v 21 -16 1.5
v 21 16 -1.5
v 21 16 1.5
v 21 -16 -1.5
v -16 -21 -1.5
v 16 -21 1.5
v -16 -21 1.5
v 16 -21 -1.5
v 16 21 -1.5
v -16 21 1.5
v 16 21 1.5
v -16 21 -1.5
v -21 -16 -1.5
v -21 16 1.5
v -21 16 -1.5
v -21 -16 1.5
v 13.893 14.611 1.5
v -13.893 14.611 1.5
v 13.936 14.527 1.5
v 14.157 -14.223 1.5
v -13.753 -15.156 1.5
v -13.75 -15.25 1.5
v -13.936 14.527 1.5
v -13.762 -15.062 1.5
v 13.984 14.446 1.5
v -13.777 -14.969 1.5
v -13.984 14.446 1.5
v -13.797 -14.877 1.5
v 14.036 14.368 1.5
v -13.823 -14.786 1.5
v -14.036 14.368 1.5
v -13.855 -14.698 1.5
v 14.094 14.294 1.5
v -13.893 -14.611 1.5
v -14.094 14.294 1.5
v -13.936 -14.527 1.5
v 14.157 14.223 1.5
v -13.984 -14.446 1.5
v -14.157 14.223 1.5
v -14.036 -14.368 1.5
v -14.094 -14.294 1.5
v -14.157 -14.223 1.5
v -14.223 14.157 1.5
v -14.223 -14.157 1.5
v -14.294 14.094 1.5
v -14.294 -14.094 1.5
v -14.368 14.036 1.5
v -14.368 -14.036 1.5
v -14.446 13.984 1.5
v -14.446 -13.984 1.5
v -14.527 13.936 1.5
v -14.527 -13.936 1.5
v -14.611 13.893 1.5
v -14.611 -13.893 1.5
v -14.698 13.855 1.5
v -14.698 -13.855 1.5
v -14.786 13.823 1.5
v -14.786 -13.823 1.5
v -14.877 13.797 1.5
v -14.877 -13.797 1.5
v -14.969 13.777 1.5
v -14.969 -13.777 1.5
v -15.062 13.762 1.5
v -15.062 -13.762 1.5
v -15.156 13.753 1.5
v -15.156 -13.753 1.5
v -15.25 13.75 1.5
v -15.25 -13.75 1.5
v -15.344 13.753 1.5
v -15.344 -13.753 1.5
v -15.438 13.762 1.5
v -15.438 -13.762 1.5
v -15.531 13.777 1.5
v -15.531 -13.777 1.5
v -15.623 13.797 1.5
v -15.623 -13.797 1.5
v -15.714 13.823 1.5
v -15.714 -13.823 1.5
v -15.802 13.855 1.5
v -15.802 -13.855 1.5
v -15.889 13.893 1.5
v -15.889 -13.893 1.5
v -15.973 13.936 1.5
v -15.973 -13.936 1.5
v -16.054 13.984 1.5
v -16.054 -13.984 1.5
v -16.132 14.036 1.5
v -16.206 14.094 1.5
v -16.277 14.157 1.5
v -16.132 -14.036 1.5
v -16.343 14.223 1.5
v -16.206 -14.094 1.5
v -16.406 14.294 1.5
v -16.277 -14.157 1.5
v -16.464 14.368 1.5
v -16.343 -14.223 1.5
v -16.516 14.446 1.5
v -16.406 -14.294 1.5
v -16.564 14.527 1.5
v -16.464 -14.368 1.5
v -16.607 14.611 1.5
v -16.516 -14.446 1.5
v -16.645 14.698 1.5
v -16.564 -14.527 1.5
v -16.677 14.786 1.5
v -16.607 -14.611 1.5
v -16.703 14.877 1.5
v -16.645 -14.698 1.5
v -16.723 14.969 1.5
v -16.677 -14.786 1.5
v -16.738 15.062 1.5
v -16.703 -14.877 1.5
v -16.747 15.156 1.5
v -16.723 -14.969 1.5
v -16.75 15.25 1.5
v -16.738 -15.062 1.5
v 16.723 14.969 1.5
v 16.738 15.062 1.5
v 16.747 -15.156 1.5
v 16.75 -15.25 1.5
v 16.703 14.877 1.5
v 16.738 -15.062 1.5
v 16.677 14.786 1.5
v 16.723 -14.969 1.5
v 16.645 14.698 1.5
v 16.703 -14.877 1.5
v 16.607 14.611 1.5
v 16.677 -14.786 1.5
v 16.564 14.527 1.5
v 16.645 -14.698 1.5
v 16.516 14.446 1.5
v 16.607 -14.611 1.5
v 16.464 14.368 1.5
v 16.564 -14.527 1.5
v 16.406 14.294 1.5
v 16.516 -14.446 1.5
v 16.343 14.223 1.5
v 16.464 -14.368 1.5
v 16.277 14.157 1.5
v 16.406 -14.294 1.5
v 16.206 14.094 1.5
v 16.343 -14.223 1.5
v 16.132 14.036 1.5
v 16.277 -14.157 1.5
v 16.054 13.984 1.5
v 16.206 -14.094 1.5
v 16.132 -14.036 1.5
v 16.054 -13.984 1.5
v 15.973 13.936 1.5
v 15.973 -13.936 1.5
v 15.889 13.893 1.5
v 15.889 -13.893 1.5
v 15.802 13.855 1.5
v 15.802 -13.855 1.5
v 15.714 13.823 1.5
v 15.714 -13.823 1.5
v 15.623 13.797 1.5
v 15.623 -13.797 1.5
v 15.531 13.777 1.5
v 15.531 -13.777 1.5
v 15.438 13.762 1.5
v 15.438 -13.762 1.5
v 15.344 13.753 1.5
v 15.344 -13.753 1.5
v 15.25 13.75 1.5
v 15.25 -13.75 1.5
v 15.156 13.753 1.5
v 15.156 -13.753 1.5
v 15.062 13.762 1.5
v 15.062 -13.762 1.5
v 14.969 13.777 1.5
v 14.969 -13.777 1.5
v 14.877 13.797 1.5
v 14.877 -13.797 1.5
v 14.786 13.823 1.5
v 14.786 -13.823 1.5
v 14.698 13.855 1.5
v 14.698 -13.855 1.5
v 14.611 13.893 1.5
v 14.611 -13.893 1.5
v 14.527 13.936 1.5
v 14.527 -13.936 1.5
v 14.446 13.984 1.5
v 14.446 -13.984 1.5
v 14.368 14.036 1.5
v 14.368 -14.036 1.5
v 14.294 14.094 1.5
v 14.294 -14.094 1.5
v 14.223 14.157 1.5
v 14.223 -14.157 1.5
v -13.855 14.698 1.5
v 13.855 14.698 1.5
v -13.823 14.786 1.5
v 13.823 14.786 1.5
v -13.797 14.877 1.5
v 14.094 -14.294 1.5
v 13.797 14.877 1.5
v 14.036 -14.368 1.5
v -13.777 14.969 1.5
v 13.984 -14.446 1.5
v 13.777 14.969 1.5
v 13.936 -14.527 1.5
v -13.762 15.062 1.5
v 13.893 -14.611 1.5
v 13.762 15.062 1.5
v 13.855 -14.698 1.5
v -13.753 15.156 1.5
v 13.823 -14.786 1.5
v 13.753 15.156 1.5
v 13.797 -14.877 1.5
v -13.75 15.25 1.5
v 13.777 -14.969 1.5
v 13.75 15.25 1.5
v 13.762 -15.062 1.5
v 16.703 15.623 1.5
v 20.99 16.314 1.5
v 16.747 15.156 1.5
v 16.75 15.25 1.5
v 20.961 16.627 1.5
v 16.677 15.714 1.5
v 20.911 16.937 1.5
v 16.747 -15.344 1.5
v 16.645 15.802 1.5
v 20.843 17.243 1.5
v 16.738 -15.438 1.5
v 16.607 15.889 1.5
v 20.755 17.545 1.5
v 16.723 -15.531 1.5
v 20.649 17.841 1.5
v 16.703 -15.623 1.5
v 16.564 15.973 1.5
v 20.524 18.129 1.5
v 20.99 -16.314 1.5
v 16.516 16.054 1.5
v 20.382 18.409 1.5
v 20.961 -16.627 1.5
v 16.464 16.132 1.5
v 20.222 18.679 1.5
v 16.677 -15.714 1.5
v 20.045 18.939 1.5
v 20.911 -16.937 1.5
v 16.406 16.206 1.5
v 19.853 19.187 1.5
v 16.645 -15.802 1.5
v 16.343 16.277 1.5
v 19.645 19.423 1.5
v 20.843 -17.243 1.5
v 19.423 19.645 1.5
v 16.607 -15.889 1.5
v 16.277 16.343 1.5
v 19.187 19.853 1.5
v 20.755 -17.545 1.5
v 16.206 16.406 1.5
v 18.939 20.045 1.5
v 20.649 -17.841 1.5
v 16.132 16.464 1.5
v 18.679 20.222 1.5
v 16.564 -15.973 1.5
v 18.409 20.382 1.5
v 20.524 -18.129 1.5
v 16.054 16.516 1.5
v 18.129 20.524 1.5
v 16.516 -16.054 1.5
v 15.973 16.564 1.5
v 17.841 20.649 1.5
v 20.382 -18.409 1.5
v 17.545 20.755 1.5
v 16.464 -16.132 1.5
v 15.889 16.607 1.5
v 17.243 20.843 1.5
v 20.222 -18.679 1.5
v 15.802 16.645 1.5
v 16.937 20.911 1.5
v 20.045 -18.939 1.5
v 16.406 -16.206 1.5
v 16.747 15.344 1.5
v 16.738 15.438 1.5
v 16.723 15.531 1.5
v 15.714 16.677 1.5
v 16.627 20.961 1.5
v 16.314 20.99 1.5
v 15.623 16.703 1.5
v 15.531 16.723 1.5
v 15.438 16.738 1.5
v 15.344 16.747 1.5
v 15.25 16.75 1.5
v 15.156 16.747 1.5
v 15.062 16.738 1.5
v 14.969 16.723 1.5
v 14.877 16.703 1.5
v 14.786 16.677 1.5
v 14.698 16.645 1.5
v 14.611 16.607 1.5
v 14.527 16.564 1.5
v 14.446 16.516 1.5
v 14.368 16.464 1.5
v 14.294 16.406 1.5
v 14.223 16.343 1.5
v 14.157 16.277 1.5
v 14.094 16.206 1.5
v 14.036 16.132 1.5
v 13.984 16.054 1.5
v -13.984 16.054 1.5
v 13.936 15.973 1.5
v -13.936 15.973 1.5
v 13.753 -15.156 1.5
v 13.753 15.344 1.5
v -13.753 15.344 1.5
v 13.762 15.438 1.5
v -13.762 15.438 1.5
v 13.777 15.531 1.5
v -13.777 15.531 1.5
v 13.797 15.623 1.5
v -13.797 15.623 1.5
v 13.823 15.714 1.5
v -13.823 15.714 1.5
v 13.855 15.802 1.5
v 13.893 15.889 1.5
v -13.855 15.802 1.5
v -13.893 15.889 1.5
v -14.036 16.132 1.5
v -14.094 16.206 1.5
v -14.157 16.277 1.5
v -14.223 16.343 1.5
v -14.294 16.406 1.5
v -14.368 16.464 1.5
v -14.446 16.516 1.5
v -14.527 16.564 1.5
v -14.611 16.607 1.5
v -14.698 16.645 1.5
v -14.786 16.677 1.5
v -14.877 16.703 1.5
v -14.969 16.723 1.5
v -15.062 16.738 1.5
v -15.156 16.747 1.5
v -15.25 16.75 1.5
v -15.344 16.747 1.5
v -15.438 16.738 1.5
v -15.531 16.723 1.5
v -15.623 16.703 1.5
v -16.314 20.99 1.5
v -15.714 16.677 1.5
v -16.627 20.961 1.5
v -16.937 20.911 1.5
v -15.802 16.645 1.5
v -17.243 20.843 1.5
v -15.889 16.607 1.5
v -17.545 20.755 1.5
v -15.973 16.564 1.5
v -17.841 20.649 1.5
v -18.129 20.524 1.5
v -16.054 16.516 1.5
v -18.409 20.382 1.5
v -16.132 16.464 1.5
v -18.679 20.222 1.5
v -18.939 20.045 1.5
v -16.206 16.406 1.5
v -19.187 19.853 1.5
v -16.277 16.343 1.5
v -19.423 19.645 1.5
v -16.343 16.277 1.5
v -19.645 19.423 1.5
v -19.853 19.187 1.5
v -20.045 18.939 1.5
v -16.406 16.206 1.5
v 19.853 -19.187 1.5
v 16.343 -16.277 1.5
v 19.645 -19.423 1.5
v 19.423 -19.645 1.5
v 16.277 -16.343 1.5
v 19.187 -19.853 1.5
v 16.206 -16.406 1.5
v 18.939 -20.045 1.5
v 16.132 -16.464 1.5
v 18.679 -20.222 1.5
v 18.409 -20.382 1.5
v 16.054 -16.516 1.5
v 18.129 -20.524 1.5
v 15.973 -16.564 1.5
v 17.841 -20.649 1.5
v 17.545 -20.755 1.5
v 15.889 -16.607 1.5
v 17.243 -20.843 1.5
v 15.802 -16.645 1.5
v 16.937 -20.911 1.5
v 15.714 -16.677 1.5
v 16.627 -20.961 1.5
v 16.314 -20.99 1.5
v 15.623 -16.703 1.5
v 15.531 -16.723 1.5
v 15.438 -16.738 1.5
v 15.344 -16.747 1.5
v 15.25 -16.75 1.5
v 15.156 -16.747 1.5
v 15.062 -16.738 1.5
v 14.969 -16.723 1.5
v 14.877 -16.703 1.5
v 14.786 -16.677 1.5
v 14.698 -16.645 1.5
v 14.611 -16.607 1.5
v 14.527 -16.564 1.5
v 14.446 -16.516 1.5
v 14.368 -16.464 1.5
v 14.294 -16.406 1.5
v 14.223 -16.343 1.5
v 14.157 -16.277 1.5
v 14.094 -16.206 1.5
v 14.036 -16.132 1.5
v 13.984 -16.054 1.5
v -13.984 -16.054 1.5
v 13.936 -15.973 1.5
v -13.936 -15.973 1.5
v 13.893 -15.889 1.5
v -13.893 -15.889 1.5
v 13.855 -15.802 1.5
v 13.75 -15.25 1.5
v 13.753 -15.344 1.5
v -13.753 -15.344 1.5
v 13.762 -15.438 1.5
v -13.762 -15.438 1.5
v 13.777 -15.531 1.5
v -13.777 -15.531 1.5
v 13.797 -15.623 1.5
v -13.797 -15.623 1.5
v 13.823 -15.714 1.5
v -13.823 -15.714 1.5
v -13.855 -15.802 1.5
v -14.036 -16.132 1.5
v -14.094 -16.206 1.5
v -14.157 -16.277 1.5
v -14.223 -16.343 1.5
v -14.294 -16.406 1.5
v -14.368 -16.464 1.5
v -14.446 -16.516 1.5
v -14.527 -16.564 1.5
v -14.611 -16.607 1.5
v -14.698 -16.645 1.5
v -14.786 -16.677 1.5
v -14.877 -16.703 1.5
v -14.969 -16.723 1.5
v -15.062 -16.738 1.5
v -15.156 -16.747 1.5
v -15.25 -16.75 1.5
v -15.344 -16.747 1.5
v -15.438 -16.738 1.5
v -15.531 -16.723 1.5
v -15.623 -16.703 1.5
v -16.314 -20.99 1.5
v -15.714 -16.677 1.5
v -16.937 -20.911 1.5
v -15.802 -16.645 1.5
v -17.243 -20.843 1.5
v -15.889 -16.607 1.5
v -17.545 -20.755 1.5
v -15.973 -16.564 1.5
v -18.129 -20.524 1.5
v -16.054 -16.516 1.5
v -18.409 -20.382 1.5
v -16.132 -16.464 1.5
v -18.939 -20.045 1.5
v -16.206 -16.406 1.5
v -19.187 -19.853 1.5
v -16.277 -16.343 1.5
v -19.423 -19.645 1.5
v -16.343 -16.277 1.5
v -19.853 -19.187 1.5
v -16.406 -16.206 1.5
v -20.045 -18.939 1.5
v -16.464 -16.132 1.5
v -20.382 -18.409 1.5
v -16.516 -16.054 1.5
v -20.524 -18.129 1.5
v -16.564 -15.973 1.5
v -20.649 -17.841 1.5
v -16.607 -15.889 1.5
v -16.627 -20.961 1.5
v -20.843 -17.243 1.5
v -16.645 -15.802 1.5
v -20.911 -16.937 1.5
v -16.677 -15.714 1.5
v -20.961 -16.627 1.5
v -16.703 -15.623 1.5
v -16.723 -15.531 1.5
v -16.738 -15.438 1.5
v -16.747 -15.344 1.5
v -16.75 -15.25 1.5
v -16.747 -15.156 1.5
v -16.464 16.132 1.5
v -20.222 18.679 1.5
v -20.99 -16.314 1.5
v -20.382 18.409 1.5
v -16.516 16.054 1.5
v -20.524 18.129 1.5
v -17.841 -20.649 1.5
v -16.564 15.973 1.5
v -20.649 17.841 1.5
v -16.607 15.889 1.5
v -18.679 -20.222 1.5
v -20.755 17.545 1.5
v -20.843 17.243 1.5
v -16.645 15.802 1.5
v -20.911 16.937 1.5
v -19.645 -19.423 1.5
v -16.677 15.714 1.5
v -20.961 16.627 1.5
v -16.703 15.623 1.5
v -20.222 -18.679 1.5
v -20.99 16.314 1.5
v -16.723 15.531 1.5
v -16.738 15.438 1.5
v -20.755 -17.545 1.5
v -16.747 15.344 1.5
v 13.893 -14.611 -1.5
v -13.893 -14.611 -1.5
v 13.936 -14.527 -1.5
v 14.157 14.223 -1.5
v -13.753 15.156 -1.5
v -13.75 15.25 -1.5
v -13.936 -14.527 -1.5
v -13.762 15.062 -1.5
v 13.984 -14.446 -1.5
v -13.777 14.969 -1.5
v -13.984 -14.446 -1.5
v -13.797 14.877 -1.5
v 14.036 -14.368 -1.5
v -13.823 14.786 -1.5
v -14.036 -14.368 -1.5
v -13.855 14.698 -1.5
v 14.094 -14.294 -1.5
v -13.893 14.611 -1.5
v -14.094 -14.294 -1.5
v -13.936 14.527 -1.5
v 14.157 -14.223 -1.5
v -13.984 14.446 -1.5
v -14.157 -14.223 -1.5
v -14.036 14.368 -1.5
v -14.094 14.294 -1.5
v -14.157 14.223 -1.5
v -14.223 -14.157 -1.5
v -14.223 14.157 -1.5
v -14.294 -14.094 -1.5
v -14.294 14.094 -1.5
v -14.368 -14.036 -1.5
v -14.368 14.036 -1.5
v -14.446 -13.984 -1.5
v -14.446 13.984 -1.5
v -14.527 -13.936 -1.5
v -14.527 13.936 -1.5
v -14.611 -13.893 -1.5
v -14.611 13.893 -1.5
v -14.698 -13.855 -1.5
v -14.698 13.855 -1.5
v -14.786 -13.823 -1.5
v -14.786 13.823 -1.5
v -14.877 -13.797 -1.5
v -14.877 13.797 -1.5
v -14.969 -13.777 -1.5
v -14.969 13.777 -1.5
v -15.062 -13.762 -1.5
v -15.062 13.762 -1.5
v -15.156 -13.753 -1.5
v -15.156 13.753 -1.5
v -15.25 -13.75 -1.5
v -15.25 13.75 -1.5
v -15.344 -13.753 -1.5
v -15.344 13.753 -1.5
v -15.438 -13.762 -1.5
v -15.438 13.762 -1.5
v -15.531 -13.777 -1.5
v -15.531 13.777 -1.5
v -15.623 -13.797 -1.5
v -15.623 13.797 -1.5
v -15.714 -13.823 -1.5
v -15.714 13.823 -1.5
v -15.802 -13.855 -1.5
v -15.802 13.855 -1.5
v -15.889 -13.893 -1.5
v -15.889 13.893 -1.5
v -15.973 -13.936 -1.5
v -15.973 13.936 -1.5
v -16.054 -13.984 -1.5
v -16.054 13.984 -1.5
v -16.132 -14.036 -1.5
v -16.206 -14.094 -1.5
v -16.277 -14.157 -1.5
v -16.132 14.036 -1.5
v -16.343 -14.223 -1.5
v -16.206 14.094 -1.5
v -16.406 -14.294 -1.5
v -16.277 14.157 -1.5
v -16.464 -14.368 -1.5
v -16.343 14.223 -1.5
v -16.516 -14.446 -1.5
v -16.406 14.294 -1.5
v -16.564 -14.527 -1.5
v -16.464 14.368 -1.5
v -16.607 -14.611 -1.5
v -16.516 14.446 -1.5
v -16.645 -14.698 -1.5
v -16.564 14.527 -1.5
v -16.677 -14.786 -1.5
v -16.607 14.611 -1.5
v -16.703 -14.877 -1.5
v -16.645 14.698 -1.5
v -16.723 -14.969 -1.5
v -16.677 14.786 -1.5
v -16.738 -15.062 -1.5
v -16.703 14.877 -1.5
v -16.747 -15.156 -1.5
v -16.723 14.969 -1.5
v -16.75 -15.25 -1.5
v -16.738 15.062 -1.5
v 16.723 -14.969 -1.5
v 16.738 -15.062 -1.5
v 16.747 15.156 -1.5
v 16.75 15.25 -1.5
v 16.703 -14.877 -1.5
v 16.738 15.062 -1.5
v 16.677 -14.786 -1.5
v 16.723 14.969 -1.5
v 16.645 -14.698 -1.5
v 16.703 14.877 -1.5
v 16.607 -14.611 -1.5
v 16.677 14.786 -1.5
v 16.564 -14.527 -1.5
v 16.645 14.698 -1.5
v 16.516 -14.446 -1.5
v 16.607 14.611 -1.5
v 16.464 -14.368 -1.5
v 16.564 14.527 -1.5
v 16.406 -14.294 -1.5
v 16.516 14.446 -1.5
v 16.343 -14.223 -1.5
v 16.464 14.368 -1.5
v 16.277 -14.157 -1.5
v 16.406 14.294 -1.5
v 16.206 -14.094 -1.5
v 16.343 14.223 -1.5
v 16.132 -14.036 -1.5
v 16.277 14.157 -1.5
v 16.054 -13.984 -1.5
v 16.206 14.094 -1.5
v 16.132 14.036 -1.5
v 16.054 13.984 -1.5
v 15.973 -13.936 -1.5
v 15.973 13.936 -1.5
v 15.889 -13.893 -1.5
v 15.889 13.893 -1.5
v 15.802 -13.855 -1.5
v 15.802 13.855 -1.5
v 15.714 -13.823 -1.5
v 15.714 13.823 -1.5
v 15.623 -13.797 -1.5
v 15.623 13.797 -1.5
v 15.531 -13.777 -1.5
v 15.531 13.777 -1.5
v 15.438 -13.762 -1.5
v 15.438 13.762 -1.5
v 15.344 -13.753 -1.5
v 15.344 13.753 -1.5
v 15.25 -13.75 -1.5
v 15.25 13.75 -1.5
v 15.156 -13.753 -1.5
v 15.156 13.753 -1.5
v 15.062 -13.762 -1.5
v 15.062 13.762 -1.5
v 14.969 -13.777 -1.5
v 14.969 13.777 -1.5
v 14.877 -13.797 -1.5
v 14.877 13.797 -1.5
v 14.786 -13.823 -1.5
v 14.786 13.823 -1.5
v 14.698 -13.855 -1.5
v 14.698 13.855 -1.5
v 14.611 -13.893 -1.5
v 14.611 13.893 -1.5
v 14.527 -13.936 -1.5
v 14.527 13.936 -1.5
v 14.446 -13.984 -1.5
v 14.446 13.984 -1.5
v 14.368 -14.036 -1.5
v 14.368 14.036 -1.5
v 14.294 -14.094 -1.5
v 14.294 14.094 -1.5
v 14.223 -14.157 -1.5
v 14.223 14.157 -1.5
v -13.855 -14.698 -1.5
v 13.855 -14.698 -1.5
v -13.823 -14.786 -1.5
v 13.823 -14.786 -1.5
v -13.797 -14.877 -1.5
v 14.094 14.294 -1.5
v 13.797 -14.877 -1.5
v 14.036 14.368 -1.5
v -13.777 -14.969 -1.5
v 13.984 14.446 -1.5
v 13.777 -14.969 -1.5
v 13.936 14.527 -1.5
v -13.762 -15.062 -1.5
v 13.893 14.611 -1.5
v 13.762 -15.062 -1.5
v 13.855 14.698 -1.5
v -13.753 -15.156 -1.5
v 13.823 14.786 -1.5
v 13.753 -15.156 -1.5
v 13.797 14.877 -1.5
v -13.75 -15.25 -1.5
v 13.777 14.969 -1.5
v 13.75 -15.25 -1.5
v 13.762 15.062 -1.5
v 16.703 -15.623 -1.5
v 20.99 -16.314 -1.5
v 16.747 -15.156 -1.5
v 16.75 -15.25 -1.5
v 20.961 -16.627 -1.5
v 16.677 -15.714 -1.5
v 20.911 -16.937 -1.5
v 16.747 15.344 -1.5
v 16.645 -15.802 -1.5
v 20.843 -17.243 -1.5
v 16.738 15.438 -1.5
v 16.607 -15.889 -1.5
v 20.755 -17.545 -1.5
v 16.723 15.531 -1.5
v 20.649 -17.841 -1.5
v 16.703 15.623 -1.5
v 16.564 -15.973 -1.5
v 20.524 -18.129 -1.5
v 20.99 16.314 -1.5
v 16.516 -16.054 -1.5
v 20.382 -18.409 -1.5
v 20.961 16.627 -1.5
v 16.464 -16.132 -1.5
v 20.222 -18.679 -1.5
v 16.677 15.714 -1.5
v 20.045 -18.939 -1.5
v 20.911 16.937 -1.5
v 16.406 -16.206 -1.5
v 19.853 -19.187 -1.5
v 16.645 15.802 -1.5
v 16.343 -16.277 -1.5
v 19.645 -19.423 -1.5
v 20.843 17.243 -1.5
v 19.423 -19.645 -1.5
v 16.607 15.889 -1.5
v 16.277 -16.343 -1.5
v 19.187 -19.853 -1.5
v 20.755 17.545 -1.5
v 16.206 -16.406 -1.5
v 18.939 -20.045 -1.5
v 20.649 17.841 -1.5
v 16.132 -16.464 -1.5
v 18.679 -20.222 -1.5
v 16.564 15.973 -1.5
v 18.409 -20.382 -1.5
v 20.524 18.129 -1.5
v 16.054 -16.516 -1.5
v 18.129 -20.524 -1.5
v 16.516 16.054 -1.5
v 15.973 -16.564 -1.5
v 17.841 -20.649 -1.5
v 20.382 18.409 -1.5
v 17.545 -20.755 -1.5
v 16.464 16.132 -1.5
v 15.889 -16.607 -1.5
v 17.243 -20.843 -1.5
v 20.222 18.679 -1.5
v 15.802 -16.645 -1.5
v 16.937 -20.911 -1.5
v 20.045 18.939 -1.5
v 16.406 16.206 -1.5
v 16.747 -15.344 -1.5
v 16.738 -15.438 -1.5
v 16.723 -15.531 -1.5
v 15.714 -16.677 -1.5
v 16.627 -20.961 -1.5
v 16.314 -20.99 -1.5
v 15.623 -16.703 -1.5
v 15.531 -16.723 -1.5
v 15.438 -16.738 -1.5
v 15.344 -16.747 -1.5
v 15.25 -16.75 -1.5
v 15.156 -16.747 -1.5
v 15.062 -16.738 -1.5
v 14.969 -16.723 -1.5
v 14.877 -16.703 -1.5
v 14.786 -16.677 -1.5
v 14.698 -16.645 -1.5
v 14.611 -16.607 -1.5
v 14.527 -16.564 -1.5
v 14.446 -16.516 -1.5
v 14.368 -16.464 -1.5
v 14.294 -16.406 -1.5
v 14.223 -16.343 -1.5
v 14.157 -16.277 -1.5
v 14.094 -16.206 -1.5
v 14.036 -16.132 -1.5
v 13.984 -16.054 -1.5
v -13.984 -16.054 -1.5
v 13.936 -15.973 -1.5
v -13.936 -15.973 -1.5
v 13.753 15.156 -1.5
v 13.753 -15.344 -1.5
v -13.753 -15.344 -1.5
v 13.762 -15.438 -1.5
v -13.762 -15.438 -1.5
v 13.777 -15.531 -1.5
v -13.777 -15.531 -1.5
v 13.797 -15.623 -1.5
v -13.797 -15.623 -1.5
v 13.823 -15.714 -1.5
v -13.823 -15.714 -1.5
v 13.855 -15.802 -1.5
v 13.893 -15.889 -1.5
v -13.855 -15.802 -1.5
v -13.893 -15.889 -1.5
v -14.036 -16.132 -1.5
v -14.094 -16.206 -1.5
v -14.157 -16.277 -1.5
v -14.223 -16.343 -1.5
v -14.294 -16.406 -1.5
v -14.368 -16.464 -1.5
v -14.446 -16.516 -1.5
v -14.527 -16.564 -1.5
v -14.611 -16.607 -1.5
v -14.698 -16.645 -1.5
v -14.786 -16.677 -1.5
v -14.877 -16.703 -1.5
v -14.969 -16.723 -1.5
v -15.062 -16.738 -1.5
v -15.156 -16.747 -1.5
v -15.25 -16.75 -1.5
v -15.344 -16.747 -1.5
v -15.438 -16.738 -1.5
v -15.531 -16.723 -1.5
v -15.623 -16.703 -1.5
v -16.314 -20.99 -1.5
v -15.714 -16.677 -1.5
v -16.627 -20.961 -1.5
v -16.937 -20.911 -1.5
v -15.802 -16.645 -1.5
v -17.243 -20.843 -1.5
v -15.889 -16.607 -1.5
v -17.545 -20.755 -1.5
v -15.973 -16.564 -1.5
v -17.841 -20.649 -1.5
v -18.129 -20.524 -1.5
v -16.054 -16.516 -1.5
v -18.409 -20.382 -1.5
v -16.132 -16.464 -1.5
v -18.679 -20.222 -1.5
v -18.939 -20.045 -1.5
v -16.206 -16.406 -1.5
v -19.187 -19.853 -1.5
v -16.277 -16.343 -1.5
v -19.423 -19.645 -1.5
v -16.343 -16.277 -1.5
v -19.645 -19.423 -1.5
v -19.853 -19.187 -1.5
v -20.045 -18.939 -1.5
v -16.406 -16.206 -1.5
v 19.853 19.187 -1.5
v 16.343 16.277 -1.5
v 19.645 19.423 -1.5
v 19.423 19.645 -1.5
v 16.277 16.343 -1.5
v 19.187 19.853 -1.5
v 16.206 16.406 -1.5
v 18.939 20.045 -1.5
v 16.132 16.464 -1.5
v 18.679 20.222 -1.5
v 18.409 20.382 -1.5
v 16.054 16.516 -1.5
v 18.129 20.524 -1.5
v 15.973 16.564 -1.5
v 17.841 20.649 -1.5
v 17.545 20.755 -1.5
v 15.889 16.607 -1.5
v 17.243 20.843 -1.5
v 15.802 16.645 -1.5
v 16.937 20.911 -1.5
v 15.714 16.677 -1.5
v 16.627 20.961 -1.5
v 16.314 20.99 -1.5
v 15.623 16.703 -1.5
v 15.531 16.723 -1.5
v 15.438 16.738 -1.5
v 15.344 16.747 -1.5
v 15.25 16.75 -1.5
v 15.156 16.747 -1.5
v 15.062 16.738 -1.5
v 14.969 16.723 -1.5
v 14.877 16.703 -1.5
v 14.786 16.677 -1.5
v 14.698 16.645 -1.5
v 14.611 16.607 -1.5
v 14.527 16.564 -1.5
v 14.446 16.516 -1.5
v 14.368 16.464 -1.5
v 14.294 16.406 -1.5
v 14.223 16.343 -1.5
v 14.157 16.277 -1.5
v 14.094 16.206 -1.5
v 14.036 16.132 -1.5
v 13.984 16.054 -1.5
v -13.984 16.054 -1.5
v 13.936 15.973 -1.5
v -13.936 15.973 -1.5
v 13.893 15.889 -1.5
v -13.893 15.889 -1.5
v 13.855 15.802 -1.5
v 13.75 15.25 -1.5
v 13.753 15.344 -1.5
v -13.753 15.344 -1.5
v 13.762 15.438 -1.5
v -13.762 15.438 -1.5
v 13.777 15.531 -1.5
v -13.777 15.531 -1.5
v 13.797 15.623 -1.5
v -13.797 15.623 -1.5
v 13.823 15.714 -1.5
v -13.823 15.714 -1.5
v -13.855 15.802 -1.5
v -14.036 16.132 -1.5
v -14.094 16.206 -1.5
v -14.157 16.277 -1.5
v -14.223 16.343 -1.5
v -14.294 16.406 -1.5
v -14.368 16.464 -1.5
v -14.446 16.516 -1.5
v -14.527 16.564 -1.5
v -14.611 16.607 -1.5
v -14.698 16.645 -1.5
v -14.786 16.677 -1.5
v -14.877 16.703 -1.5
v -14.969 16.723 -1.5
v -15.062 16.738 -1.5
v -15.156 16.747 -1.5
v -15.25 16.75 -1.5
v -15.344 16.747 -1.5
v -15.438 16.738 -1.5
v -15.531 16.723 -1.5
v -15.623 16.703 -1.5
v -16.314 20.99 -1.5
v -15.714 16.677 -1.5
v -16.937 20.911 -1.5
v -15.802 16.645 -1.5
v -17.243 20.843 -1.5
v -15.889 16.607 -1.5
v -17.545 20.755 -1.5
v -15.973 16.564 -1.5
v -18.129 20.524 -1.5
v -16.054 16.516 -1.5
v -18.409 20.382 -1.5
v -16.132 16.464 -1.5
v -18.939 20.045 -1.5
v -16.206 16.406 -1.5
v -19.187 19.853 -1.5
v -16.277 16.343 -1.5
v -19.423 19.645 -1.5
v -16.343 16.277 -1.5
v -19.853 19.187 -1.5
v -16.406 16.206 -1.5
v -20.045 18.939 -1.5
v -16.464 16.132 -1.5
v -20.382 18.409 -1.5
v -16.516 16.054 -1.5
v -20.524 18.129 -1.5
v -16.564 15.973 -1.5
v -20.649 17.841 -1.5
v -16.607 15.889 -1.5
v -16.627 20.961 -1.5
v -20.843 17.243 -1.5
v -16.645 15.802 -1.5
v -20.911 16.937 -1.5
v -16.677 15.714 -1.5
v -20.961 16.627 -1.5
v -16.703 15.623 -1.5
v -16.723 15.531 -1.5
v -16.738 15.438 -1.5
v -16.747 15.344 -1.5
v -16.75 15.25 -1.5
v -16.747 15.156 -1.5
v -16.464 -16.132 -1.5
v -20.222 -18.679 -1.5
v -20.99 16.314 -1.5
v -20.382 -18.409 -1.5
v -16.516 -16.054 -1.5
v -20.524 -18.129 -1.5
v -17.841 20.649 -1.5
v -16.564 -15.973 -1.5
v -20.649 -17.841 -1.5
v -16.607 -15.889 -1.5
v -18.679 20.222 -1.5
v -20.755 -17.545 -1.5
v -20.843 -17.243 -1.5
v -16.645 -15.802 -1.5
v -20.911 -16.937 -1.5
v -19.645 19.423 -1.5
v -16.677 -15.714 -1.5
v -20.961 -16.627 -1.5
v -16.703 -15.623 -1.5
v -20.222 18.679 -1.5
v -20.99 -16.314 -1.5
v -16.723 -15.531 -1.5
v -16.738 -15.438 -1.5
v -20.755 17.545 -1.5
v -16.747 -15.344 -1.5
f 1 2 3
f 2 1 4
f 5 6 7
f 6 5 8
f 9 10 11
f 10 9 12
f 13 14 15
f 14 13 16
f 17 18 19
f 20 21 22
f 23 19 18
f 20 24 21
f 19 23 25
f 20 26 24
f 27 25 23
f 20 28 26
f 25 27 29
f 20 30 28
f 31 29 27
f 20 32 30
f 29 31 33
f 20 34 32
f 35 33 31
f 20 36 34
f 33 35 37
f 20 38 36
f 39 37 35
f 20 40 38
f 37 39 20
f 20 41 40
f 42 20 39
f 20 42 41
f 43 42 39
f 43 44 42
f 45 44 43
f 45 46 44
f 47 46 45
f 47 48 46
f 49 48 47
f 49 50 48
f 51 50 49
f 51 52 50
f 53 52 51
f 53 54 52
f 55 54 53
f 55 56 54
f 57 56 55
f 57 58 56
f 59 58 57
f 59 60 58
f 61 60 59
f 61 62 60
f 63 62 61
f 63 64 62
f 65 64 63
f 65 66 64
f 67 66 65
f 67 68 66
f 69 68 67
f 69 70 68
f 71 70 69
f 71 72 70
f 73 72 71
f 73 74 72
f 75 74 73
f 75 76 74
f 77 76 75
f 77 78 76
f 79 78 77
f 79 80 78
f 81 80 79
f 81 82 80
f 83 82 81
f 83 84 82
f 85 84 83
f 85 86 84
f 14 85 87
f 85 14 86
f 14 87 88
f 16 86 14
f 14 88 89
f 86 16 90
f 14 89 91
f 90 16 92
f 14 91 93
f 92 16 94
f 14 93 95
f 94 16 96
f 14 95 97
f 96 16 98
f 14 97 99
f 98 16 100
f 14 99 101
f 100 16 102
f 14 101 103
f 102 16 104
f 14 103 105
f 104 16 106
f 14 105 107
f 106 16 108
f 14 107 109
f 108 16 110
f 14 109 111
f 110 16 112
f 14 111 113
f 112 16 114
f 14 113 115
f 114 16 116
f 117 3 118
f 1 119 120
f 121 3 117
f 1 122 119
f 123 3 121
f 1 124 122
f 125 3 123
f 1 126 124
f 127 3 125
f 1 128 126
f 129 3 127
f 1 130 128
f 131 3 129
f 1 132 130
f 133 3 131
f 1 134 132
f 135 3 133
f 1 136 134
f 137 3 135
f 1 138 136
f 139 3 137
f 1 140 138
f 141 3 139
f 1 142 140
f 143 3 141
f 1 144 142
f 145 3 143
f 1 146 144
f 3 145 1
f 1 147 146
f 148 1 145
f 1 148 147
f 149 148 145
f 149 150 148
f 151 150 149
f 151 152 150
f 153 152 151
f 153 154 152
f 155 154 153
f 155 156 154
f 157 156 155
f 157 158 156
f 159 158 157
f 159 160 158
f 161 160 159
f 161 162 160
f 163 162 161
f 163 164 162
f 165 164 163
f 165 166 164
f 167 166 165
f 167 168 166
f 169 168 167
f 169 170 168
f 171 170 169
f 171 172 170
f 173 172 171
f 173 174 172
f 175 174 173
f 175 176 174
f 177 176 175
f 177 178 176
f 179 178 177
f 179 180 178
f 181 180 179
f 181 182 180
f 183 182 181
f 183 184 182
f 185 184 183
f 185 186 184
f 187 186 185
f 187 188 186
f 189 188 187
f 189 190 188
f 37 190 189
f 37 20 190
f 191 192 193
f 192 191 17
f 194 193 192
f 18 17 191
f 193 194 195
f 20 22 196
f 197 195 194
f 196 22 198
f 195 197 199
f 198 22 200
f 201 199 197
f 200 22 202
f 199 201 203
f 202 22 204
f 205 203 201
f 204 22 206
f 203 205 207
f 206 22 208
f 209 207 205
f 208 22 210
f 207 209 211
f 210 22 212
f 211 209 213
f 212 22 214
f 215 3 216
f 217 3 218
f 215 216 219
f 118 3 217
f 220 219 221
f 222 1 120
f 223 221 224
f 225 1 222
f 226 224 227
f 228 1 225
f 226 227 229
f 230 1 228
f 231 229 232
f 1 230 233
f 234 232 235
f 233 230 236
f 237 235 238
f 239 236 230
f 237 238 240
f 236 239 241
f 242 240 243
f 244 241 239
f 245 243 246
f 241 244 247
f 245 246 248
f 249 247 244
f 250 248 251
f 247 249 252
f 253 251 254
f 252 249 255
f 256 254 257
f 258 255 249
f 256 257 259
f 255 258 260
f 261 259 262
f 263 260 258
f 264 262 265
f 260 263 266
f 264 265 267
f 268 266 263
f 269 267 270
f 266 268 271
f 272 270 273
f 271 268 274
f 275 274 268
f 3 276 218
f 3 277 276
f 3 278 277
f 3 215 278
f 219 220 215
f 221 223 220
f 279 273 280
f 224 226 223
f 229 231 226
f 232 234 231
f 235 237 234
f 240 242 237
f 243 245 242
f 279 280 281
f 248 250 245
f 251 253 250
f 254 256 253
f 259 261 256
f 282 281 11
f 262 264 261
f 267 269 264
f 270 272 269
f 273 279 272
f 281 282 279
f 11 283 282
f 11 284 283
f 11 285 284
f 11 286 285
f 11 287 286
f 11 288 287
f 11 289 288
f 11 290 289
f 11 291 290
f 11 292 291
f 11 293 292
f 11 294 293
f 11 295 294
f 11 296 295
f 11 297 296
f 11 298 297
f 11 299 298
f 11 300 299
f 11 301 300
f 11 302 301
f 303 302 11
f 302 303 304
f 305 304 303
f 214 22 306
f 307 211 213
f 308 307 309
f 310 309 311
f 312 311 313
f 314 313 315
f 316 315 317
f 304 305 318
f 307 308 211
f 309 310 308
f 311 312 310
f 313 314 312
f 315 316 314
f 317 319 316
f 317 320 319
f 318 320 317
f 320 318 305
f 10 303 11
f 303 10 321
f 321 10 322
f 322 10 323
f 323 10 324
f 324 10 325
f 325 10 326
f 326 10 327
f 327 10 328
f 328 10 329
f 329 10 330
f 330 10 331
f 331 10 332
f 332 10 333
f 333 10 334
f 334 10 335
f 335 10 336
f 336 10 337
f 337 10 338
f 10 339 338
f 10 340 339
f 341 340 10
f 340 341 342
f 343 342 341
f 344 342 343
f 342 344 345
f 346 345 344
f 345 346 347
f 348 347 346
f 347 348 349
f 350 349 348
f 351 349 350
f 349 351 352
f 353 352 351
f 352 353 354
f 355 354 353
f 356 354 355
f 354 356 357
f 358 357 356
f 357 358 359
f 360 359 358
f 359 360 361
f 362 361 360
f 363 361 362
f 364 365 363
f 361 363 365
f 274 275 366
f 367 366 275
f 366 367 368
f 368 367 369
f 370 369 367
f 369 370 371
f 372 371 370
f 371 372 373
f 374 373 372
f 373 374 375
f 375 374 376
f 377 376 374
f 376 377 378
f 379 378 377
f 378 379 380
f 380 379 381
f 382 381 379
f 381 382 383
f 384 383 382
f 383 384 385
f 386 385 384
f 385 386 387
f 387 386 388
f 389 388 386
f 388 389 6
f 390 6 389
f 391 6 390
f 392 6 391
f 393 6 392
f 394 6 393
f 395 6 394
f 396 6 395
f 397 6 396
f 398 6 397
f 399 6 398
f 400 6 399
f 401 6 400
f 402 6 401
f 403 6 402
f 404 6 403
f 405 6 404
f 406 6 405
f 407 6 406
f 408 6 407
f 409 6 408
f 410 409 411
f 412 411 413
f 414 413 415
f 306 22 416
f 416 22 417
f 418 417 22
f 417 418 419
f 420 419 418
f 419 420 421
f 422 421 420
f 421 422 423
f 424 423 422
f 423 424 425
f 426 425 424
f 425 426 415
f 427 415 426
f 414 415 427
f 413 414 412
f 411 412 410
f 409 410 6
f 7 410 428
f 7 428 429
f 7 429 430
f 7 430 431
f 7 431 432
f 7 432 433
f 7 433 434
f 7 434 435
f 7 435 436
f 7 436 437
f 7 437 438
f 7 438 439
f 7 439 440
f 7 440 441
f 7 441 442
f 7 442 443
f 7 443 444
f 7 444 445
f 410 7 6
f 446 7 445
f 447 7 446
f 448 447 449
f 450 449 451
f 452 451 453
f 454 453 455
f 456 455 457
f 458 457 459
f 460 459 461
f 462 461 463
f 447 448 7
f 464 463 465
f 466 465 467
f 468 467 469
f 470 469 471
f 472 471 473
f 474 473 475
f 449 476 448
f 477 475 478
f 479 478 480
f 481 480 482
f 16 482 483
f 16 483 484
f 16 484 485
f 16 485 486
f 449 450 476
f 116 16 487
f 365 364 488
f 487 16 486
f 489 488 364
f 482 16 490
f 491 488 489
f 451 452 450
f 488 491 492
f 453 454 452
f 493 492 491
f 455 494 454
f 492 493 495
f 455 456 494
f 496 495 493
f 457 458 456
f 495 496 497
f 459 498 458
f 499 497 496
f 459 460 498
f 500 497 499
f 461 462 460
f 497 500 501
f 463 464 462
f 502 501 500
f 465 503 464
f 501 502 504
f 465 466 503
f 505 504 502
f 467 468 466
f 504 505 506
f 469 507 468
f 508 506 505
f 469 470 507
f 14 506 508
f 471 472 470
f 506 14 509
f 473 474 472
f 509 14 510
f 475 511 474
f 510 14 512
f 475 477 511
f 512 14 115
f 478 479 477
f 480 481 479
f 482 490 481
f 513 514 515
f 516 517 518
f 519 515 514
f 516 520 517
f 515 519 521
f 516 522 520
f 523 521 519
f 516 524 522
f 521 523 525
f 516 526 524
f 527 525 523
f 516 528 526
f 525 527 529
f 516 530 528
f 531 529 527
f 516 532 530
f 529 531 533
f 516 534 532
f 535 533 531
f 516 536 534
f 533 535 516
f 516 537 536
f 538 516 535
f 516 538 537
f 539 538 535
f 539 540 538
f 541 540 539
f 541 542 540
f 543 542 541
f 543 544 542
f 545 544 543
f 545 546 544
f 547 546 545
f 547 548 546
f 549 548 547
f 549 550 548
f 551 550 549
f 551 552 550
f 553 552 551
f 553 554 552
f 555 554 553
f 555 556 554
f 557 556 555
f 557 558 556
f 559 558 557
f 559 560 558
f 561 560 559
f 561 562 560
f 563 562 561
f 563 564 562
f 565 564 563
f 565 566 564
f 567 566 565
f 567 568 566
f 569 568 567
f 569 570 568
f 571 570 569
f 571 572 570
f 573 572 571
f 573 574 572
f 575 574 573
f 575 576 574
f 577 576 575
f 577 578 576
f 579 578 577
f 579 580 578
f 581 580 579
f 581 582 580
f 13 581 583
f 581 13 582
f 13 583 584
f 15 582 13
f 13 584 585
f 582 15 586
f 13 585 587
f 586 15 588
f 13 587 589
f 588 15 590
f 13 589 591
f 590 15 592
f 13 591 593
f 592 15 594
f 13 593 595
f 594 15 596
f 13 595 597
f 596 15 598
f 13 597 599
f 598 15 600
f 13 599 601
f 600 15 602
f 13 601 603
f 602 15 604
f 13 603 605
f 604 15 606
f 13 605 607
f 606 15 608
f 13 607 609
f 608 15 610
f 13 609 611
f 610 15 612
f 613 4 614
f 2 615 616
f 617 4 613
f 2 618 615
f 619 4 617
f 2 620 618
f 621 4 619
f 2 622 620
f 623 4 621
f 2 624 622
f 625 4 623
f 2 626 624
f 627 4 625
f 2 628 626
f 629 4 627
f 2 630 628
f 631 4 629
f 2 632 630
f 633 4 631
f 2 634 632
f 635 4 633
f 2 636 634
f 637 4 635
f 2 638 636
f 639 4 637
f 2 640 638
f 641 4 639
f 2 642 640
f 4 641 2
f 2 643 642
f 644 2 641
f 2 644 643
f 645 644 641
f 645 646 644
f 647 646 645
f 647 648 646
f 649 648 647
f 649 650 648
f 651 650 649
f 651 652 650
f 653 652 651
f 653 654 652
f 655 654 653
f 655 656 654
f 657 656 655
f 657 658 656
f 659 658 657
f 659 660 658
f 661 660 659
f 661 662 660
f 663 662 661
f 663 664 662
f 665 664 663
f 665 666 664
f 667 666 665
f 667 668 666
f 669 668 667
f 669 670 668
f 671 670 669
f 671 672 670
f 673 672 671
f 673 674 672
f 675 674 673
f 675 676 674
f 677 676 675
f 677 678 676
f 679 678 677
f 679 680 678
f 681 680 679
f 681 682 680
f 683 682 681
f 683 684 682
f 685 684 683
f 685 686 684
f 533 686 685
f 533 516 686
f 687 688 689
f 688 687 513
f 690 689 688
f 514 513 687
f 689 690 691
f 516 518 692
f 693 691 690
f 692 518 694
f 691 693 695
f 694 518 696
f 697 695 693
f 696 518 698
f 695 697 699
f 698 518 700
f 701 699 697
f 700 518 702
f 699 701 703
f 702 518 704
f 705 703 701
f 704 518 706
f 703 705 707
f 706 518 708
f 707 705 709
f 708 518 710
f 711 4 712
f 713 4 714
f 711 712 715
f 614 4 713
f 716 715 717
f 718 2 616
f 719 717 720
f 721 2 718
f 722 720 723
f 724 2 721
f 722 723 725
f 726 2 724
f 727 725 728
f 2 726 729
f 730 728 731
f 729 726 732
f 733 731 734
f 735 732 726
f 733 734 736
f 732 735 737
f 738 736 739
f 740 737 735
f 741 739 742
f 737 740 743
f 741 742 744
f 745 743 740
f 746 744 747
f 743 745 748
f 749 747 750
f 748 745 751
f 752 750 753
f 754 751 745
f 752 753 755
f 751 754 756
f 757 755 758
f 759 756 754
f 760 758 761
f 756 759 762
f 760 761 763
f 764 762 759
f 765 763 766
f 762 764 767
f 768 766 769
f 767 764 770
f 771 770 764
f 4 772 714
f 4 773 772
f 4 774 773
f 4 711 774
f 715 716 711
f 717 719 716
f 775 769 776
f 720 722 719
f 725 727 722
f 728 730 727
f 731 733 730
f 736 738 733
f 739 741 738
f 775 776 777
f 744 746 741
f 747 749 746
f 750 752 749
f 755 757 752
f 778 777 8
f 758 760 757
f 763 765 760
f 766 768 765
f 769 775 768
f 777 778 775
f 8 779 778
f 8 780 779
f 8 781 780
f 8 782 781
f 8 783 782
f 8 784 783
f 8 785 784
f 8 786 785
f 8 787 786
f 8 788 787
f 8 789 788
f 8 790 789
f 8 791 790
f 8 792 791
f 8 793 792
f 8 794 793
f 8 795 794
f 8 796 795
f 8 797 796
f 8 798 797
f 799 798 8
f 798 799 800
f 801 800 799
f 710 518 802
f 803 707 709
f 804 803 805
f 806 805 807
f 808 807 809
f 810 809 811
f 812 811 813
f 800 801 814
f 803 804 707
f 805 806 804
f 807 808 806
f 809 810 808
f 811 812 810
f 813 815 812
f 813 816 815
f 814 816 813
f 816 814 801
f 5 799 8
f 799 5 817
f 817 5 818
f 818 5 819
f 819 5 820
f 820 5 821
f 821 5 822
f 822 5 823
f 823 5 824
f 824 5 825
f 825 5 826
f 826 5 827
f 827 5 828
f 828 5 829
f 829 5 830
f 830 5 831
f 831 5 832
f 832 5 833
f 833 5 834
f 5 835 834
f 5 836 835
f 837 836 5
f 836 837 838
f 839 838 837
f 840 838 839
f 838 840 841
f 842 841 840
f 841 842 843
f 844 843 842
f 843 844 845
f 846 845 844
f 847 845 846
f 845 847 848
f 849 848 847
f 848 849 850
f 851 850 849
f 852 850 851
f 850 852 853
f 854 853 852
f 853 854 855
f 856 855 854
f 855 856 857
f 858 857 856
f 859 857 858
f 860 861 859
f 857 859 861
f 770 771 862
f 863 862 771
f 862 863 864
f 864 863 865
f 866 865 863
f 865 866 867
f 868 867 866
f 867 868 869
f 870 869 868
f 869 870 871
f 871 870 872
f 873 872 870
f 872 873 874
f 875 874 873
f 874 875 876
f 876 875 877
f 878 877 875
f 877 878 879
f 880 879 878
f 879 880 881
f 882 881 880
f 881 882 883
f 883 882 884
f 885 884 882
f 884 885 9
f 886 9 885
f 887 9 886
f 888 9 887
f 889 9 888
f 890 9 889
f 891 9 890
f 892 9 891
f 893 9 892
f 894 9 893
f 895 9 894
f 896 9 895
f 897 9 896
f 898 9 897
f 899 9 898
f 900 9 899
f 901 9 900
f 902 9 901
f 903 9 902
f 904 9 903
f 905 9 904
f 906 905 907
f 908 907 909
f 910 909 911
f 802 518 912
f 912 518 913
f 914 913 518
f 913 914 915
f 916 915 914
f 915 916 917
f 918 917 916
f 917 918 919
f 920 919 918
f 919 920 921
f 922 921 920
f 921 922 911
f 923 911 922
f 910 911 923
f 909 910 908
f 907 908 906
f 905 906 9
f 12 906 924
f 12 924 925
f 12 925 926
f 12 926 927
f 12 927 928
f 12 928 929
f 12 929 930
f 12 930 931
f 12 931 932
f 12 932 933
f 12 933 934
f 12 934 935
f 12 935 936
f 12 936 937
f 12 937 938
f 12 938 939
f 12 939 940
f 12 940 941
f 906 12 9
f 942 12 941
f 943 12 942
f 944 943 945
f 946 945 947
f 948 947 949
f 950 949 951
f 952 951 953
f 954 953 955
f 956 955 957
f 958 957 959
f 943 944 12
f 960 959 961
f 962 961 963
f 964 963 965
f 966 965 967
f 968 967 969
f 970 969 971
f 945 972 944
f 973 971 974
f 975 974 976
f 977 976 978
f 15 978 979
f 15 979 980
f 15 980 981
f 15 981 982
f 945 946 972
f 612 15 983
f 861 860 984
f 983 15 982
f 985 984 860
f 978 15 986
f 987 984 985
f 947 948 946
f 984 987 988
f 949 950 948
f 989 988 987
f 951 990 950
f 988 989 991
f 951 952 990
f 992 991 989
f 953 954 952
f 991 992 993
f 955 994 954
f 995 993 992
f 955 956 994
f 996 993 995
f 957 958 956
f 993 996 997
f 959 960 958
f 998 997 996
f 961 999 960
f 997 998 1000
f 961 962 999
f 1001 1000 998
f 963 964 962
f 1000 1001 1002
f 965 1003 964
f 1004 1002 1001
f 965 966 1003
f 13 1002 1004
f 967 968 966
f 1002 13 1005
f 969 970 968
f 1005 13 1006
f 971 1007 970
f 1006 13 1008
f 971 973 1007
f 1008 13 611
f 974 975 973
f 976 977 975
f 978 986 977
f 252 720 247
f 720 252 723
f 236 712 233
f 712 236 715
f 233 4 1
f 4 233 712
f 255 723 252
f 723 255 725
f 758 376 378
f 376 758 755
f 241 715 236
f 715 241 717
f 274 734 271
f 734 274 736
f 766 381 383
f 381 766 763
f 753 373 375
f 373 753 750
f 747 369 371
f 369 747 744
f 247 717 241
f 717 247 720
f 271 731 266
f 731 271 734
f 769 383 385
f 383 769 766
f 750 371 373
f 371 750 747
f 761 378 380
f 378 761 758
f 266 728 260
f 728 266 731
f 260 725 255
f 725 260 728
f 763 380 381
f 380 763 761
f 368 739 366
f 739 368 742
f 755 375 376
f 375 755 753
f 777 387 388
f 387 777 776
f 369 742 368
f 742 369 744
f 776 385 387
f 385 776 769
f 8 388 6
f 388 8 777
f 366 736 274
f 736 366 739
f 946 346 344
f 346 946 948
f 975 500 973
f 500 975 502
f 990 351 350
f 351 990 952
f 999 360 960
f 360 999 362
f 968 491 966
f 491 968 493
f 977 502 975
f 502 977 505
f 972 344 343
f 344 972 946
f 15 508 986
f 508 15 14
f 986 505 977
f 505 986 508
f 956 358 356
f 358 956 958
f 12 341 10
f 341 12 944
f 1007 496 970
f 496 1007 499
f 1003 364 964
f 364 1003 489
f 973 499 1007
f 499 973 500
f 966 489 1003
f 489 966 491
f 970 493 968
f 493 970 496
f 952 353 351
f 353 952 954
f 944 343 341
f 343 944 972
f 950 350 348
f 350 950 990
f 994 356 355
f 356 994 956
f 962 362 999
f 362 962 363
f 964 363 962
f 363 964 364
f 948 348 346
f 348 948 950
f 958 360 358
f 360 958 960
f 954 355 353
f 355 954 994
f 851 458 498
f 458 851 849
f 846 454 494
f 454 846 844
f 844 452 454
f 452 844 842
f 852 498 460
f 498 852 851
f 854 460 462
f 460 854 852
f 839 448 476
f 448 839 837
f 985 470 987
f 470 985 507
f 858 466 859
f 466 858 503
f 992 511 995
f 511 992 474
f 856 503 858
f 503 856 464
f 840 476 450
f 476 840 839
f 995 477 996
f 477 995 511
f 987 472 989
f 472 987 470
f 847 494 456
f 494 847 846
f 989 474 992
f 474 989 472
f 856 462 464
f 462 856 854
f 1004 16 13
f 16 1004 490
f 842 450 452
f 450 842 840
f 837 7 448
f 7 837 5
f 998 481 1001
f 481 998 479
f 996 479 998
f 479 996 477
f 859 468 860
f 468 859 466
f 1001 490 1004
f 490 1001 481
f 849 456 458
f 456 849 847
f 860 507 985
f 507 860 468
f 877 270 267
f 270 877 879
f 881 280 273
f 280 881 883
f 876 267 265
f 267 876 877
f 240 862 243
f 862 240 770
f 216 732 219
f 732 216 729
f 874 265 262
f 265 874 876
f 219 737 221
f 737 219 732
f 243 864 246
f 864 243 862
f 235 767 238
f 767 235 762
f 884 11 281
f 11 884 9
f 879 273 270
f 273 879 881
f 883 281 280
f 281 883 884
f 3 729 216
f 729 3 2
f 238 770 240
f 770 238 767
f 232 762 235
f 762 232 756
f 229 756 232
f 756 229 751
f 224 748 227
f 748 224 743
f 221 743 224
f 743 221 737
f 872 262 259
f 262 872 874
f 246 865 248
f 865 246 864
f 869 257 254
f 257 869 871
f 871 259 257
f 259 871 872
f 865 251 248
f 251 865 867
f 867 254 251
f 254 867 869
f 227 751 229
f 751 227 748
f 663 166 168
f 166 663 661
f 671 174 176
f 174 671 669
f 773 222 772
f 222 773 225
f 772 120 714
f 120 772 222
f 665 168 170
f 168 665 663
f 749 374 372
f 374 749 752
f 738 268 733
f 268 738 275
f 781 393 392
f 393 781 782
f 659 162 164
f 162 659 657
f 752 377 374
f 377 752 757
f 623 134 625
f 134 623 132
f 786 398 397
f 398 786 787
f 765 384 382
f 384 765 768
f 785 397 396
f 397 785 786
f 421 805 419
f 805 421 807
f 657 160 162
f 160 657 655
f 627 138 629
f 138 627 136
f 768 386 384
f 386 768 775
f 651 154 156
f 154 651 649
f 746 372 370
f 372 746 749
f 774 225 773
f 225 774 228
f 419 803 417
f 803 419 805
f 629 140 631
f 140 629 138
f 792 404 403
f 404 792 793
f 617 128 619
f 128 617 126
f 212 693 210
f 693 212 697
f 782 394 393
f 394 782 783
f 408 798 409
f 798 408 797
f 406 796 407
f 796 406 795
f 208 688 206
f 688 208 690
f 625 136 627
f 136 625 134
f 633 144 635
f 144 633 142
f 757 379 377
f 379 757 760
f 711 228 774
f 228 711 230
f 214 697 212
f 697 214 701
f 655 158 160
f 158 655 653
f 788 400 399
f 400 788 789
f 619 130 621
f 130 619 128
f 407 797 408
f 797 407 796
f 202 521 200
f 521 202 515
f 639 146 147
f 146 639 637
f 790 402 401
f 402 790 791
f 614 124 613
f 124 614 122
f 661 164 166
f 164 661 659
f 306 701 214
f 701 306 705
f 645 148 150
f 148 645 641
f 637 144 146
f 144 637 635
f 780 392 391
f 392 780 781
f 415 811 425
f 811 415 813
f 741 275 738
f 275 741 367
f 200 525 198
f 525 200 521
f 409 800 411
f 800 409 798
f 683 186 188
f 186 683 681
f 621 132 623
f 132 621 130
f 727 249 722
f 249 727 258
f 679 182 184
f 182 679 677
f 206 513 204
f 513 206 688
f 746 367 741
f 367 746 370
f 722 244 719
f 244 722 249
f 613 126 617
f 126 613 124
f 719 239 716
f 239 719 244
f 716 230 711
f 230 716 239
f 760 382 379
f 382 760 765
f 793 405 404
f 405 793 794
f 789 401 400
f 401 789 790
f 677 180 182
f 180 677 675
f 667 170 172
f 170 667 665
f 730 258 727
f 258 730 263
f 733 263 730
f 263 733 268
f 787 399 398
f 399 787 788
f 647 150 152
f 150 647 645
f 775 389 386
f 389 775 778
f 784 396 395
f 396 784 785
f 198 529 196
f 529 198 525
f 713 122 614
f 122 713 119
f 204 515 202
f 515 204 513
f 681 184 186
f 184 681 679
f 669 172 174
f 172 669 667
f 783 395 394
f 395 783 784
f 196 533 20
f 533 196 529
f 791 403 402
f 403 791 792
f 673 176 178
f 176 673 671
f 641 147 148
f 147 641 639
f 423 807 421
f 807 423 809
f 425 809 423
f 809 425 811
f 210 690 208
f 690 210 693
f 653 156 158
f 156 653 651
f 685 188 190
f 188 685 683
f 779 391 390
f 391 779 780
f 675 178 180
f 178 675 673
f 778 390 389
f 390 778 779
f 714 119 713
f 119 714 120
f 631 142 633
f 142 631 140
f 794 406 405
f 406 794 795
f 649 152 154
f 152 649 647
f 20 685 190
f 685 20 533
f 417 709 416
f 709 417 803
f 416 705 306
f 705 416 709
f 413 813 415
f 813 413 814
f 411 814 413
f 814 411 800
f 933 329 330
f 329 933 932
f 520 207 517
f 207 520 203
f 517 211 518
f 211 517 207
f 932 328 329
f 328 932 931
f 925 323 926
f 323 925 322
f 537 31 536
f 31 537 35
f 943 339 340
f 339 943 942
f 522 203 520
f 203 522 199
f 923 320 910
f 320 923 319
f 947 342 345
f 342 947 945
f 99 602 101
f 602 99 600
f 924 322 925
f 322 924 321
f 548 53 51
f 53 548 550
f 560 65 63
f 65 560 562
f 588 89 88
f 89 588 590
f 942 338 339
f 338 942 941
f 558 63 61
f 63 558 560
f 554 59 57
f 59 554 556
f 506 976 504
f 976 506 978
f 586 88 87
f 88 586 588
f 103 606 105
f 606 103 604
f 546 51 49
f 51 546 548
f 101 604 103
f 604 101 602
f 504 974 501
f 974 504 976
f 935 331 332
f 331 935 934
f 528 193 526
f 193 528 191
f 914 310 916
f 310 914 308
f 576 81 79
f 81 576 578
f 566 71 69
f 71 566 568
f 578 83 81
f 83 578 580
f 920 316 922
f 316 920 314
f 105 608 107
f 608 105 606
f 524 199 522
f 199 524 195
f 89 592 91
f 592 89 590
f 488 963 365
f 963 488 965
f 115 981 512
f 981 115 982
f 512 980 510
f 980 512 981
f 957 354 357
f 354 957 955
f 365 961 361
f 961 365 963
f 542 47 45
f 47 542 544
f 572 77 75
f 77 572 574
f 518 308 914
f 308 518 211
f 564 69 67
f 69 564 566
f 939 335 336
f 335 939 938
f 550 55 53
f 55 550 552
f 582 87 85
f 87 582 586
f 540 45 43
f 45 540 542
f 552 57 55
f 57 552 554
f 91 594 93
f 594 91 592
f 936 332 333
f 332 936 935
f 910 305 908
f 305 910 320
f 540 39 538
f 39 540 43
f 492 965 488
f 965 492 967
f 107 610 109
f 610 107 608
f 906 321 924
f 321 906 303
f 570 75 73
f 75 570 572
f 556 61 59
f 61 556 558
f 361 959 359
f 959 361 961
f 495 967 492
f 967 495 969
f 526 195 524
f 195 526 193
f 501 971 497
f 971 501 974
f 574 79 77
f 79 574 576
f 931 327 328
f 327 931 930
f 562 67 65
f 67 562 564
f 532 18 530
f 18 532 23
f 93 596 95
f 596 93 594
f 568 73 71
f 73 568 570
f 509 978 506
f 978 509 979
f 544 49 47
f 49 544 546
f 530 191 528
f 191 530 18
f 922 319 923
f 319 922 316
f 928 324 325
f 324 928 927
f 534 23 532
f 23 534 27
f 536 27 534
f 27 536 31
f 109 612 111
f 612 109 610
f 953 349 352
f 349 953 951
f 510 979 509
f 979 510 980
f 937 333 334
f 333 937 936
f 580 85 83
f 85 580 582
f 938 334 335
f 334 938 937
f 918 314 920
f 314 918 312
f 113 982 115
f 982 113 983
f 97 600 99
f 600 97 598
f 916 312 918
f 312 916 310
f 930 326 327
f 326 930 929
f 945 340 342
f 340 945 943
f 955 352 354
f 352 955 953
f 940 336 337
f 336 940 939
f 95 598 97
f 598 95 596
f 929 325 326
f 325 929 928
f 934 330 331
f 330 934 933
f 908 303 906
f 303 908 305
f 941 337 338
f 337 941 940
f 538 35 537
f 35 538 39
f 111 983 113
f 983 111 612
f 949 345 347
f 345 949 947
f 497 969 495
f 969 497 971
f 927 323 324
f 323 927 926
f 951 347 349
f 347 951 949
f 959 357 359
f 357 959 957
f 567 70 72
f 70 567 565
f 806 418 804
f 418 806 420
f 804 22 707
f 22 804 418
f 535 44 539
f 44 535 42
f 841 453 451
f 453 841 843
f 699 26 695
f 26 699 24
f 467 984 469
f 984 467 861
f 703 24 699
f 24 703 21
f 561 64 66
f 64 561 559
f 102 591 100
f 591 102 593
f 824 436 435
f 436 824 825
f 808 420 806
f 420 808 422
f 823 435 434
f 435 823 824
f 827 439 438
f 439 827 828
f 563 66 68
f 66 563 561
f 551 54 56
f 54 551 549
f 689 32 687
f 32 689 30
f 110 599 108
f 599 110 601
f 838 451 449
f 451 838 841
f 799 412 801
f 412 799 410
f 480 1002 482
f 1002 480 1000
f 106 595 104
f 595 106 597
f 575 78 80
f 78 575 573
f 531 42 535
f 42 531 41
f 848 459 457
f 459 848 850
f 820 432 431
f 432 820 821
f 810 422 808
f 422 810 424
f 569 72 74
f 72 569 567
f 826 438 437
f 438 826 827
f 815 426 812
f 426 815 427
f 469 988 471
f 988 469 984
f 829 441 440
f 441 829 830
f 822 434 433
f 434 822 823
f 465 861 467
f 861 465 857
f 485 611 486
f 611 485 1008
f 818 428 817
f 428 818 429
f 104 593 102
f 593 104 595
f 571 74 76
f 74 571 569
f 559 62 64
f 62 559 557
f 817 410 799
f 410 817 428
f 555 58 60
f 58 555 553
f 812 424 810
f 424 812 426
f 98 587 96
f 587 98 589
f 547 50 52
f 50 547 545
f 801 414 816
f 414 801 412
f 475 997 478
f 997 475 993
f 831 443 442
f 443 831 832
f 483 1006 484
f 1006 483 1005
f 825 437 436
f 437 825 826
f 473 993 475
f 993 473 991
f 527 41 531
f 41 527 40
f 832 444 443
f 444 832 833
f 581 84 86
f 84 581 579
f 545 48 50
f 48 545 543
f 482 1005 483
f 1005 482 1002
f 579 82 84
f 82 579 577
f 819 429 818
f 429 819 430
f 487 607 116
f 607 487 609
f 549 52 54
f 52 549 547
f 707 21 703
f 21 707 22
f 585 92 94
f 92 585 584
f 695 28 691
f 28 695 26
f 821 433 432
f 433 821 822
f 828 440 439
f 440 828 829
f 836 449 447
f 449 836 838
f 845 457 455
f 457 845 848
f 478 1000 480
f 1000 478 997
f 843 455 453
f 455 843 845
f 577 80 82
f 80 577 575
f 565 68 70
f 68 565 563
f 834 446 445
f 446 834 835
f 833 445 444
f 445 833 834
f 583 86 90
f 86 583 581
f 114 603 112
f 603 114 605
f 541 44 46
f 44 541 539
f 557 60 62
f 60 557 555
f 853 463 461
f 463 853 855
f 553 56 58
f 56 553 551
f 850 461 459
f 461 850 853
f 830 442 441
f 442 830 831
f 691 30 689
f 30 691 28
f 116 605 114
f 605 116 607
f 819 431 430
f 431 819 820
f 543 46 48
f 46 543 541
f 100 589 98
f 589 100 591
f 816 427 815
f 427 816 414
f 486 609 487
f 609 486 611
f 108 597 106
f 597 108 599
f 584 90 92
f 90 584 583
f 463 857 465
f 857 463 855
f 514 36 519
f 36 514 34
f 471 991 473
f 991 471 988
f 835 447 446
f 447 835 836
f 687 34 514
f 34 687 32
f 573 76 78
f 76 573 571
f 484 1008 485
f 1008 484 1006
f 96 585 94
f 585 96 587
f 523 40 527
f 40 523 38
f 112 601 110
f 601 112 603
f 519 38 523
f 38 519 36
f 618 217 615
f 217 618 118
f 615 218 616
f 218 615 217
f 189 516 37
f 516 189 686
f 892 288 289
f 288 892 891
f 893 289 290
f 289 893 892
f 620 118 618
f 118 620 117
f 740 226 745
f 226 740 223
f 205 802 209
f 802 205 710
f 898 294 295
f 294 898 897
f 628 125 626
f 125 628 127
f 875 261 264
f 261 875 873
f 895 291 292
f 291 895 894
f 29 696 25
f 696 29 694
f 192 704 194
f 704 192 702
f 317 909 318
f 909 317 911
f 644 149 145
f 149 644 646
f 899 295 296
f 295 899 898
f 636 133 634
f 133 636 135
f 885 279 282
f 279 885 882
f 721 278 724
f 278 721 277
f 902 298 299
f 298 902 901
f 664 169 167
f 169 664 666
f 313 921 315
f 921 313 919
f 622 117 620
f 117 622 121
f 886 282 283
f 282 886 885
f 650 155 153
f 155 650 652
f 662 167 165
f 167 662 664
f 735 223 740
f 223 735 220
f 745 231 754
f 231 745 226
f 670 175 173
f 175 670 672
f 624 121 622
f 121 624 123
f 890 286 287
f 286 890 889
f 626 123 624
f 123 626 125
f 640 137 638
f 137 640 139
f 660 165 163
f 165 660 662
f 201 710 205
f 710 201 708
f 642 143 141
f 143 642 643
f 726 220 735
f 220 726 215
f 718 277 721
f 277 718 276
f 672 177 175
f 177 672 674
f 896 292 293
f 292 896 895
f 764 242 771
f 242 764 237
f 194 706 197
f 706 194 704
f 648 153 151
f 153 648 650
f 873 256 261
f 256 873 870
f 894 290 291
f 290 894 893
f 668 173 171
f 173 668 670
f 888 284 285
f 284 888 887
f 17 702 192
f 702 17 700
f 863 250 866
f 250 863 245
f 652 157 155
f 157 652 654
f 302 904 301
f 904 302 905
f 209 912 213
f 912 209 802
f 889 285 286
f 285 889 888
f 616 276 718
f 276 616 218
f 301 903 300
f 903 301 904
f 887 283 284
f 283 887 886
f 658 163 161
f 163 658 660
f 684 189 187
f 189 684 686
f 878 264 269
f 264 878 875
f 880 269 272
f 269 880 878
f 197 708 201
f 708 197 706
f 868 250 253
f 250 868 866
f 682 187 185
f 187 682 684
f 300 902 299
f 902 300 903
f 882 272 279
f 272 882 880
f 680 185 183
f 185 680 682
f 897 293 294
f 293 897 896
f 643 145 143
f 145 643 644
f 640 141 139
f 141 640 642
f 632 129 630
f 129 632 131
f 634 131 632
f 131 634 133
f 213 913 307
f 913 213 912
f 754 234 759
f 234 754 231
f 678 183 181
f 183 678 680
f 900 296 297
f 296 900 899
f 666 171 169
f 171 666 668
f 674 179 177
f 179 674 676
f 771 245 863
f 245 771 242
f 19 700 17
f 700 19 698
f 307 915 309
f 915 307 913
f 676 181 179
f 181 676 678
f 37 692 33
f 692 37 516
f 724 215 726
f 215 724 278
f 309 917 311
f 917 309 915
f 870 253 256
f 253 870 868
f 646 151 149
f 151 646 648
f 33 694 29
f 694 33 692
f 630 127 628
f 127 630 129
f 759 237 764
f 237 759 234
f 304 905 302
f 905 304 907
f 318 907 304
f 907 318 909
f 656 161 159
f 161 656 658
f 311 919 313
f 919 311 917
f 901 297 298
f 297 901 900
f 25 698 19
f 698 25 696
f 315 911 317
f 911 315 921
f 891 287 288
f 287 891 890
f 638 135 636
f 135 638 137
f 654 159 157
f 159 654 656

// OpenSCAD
module stepper_holes(depth){
    temp = [1,-1,-1,1];
    for(i=[0:3])
        let(r = 30.5/2, dx = temp[i]*r, dz = temp[(i*2)%4]*r, x=0,y=0,z=0)
            translate([x+dx,y,z+dz])rotate([90,0,0])cylinder(h=depth,r=1.5,$fn=100,center=true);
    
}
module round_cube(size_x, size_y, size_z, r){
    temp = [1,-1,-1, 1];
    difference(){
        cube([size_x, size_y, size_z], center=true);
        for(i=[0:3])let(dx=temp[i]*(size_x/2-r/2+2.5),dz=temp[(i*2)%4]*(size_z/2-r/2+2.5))
            translate([dx,0,dz])cube([r+5, size_y+5, r+5], center=true);
    }
    for(i=[0:3])let(dx=temp[i]*(size_x/2-r),dz=temp[(i*2)%4]*(size_z/2-r))
        translate([dx,0,dz])rotate([90,0,0])cylinder(h=size_y,r=r,center=true,$fn=100);
}


rotate([90,0,0])difference(){
    round_cube(42,3,42, 5);
    stepper_holes(20);
}
